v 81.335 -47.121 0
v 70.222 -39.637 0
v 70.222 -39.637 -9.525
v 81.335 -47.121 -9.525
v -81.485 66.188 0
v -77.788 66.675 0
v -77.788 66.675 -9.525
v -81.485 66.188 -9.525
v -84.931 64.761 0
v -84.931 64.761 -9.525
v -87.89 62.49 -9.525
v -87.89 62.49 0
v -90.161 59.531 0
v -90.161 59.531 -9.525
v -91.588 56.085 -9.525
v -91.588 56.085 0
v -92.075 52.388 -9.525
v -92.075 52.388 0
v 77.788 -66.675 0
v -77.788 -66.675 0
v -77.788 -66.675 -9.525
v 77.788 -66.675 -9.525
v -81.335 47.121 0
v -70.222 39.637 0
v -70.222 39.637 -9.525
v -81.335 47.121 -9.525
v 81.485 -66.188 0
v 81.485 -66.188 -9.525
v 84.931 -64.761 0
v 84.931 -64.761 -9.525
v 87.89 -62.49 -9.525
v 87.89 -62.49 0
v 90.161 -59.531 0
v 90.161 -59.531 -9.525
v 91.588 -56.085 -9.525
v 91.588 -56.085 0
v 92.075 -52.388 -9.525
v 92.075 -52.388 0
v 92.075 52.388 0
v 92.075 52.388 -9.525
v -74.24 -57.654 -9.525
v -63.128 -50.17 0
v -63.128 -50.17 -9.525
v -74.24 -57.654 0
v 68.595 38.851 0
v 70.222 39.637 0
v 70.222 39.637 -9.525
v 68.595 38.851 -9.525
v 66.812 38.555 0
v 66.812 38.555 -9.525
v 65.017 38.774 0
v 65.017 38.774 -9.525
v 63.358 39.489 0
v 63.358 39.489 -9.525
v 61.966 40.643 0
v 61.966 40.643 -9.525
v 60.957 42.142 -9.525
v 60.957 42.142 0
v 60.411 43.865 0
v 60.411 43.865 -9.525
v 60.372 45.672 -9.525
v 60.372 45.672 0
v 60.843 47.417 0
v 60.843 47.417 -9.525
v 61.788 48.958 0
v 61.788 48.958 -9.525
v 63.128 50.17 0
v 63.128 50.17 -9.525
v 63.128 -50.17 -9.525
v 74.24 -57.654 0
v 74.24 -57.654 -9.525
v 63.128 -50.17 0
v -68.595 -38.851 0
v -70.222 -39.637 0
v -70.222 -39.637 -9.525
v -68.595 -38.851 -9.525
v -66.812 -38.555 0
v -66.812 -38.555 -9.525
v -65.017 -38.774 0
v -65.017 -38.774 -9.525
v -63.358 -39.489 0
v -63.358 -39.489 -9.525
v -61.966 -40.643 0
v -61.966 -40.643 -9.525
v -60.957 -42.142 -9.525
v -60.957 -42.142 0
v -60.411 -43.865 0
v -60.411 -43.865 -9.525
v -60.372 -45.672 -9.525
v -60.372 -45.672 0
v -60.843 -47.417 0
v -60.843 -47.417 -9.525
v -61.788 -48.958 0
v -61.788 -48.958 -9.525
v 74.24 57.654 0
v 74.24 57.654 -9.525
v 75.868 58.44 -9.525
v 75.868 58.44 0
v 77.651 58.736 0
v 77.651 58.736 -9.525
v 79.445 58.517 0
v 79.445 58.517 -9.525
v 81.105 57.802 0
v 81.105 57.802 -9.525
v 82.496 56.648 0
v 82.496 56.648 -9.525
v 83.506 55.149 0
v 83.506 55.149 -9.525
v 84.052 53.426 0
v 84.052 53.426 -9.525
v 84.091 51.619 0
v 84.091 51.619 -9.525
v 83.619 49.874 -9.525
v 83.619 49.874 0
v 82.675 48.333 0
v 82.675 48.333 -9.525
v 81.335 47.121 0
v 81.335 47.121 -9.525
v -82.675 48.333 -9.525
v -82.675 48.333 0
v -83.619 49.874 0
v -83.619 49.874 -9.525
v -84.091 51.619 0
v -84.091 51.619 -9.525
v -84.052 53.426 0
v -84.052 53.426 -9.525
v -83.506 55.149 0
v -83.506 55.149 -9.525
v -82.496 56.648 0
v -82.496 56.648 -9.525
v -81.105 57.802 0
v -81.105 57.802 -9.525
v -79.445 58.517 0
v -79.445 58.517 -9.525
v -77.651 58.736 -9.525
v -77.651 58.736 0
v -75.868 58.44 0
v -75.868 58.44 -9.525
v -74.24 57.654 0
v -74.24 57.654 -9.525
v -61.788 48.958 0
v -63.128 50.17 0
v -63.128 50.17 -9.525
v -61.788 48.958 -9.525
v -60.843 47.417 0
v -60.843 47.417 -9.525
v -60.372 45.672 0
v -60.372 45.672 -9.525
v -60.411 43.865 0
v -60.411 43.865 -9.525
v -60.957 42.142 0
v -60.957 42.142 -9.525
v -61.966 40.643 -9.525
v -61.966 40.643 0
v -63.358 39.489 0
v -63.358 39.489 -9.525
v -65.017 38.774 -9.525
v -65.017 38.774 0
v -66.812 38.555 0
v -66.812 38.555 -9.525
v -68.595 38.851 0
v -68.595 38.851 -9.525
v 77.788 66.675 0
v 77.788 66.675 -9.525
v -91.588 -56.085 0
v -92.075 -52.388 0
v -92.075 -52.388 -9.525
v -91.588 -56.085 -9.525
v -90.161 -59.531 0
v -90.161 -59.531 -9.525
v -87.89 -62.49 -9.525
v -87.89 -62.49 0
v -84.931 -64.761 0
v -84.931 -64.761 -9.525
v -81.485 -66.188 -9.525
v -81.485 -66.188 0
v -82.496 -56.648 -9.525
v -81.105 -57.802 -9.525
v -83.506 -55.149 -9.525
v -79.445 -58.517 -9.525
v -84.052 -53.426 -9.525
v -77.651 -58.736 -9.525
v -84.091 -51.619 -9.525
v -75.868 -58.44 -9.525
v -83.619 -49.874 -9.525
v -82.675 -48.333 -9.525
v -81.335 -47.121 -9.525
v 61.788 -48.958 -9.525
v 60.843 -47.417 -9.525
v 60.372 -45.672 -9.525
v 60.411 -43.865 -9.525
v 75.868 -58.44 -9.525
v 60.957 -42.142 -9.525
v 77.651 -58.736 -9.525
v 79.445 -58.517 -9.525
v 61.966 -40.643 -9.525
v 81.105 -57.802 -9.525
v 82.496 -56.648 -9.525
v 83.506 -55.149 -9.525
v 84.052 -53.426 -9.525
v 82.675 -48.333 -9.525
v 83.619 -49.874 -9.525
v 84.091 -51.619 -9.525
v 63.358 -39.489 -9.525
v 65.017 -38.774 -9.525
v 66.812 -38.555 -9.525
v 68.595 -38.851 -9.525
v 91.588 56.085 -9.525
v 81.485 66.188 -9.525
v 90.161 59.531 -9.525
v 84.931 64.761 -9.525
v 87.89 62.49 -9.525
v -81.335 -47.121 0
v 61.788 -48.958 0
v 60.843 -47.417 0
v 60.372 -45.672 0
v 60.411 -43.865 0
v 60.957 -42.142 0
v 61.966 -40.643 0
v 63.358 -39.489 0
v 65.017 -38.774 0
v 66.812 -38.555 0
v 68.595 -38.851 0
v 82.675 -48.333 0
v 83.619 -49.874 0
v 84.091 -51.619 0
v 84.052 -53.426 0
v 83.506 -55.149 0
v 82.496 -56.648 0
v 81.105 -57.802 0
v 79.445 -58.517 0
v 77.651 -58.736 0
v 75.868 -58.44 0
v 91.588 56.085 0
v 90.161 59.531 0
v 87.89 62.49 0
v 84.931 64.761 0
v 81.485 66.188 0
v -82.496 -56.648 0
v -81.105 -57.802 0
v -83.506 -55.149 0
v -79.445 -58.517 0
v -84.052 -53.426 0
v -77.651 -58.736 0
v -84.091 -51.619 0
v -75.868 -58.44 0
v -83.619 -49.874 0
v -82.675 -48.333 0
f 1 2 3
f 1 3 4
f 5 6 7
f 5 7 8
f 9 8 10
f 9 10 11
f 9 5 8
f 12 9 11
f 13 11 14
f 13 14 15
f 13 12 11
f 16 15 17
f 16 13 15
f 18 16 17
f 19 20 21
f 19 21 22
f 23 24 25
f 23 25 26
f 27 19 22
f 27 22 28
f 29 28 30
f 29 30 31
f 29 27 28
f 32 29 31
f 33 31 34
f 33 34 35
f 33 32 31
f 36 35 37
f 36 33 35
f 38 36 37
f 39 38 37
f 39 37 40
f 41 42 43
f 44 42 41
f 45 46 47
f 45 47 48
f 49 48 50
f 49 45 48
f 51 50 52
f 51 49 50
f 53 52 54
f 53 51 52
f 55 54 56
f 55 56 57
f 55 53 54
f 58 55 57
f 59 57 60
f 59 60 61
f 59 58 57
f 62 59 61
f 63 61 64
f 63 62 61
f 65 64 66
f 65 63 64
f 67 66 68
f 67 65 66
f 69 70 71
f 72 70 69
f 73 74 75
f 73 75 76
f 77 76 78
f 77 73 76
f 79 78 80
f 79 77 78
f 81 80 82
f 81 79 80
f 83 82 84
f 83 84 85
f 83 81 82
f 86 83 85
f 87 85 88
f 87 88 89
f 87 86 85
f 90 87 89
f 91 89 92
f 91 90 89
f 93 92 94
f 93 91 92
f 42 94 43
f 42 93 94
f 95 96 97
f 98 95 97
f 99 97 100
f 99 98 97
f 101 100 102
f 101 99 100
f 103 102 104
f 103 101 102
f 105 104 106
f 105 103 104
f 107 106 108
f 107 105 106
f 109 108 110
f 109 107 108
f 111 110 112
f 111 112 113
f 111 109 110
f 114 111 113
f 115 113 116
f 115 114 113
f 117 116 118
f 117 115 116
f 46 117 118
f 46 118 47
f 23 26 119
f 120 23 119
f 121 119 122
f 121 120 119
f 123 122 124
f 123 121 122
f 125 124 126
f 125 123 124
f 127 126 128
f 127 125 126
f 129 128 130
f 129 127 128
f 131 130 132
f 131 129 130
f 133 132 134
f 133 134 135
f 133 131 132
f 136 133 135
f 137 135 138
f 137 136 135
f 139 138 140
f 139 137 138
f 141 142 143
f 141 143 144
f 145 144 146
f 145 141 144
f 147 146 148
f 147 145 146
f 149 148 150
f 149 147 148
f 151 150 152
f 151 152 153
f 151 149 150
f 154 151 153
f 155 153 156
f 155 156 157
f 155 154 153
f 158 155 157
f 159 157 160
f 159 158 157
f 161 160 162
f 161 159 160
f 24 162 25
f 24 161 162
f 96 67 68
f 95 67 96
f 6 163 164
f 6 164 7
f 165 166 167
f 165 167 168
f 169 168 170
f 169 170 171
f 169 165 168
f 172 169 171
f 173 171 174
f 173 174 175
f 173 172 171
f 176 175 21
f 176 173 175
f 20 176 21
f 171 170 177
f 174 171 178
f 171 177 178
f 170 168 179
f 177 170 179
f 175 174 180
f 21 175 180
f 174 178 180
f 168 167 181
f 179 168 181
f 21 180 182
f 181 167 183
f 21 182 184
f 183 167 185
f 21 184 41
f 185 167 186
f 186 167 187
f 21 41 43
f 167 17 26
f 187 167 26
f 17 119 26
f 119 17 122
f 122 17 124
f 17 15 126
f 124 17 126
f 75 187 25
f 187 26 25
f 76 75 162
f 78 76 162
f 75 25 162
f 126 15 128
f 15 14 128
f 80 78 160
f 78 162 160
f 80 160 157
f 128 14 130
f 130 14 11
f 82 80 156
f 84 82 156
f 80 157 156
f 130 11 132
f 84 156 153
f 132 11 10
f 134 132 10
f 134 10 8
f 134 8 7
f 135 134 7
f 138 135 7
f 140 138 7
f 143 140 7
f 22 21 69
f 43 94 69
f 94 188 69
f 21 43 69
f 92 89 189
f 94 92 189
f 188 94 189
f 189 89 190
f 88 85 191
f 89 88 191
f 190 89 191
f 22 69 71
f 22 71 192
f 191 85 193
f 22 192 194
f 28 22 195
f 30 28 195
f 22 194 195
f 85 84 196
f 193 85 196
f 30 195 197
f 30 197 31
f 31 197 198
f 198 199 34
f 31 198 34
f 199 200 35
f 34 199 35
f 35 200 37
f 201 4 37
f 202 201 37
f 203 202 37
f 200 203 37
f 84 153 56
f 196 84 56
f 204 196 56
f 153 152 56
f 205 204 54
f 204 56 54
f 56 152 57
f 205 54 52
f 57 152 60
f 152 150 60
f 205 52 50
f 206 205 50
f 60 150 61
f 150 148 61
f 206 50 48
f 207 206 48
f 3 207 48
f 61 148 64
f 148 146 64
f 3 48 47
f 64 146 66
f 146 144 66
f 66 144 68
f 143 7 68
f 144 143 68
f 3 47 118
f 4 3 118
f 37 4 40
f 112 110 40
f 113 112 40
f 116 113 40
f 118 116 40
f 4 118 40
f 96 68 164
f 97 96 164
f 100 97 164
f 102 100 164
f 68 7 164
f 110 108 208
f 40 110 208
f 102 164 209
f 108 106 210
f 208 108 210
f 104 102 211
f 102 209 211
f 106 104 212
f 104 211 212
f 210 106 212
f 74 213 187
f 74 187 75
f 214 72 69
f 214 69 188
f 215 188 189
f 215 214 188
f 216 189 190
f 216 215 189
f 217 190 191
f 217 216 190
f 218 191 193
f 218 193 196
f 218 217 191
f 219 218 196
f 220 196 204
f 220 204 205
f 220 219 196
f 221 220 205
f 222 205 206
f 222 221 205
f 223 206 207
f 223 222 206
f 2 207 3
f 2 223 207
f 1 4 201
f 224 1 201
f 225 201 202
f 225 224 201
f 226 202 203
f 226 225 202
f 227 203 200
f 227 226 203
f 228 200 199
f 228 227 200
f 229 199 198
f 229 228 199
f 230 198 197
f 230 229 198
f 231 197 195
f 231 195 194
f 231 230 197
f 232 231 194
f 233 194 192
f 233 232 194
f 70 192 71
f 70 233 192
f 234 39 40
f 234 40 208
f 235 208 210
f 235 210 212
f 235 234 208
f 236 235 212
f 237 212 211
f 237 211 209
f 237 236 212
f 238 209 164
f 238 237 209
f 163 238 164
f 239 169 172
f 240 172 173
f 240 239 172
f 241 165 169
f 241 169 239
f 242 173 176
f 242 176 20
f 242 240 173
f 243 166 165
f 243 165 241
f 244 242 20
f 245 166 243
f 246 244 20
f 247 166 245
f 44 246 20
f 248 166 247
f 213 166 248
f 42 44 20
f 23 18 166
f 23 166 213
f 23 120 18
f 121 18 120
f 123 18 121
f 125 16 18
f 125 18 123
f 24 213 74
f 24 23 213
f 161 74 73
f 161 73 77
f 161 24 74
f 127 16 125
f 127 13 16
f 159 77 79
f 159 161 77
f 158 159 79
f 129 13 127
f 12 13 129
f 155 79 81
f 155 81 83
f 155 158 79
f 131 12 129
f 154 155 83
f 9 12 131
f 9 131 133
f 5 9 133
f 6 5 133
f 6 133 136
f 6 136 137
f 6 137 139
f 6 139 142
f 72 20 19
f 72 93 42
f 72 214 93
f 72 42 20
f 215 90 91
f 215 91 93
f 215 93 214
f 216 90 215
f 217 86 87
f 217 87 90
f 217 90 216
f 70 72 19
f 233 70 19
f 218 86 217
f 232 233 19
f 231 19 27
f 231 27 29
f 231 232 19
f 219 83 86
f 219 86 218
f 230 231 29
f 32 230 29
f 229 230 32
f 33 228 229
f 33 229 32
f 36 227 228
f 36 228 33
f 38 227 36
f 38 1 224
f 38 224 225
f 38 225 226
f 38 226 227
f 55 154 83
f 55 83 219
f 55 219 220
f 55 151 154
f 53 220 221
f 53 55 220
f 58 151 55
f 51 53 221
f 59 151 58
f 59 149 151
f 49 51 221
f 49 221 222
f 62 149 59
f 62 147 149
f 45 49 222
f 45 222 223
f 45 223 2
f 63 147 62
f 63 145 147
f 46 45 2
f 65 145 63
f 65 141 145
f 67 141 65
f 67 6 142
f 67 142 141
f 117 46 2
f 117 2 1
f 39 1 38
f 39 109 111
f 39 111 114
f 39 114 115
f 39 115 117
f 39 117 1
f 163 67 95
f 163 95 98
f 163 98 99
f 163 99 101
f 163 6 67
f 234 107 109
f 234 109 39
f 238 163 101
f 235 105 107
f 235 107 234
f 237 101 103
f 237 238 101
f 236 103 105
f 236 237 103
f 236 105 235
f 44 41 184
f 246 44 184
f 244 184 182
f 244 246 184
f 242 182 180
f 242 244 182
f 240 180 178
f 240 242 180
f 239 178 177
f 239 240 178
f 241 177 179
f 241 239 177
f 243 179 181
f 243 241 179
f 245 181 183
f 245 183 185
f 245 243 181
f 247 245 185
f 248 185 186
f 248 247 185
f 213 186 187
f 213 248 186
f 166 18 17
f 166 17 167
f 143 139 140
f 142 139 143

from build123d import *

# Parameters (mm, degrees)
F1_DEPTH = 9.525


with BuildPart() as f1:
    # F0 (on Top) → F1 (new body)
    with BuildSketch(Plane.XY):
        with BuildLine():
            Line((-77.7875, -66.675), (77.7875, -66.675))
            ThreePointArc((77.7875, -66.675), (87.890288, -62.490288), (92.075, -52.3875))
            Line((92.075, -52.3875), (92.075, 52.3875))
            ThreePointArc((92.075, 52.3875), (87.890288, 62.490288), (77.7875, 66.675))
            Line((77.7875, 66.675), (-77.7875, 66.675))
            ThreePointArc((-77.7875, 66.675), (-87.890288, 62.490288), (-92.075, 52.3875))
            Line((-92.075, 52.3875), (-92.075, -52.3875))
            ThreePointArc((-92.075, -52.3875), (-87.890288, -62.490288), (-77.7875, -66.675))
        make_face()
        with BuildLine():
            ThreePointArc((-74.240388, -57.654424), (-83.054424, -55.934612), (-81.334612, -47.120576))
            Line((-81.334612, -47.120576), (-70.222112, -39.636647))
            ThreePointArc((-70.222112, -39.636647), (-61.408076, -41.356459), (-63.127888, -50.170496))
            Line((-63.127888, -50.170496), (-74.240388, -57.654424))
        make_face(mode=Mode.SUBTRACT)
        with BuildLine():
            ThreePointArc((81.334612, -47.120576), (83.054424, -55.934612), (74.240388, -57.654424))
            Line((74.240388, -57.654424), (63.127888, -50.170496))
            ThreePointArc((63.127888, -50.170496), (61.408076, -41.356459), (70.222112, -39.636647))
            Line((70.222112, -39.636647), (81.334612, -47.120576))
        make_face(mode=Mode.SUBTRACT)
        with BuildLine():
            ThreePointArc((-81.334612, 47.120576), (-83.054424, 55.934612), (-74.240388, 57.654424))
            Line((-74.240388, 57.654424), (-63.127888, 50.170496))
            ThreePointArc((-63.127888, 50.170496), (-61.408076, 41.356459), (-70.222112, 39.636647))
            Line((-70.222112, 39.636647), (-81.334612, 47.120576))
        make_face(mode=Mode.SUBTRACT)
        with BuildLine():
            ThreePointArc((74.240388, 57.654424), (83.054424, 55.934612), (81.334612, 47.120576))
            Line((81.334612, 47.120576), (70.222112, 39.636647))
            ThreePointArc((70.222112, 39.636647), (61.408076, 41.356459), (63.127888, 50.170496))
            Line((63.127888, 50.170496), (74.240388, 57.654424))
        make_face(mode=Mode.SUBTRACT)
    extrude(amount=-F1_DEPTH)


solid = f1.part
